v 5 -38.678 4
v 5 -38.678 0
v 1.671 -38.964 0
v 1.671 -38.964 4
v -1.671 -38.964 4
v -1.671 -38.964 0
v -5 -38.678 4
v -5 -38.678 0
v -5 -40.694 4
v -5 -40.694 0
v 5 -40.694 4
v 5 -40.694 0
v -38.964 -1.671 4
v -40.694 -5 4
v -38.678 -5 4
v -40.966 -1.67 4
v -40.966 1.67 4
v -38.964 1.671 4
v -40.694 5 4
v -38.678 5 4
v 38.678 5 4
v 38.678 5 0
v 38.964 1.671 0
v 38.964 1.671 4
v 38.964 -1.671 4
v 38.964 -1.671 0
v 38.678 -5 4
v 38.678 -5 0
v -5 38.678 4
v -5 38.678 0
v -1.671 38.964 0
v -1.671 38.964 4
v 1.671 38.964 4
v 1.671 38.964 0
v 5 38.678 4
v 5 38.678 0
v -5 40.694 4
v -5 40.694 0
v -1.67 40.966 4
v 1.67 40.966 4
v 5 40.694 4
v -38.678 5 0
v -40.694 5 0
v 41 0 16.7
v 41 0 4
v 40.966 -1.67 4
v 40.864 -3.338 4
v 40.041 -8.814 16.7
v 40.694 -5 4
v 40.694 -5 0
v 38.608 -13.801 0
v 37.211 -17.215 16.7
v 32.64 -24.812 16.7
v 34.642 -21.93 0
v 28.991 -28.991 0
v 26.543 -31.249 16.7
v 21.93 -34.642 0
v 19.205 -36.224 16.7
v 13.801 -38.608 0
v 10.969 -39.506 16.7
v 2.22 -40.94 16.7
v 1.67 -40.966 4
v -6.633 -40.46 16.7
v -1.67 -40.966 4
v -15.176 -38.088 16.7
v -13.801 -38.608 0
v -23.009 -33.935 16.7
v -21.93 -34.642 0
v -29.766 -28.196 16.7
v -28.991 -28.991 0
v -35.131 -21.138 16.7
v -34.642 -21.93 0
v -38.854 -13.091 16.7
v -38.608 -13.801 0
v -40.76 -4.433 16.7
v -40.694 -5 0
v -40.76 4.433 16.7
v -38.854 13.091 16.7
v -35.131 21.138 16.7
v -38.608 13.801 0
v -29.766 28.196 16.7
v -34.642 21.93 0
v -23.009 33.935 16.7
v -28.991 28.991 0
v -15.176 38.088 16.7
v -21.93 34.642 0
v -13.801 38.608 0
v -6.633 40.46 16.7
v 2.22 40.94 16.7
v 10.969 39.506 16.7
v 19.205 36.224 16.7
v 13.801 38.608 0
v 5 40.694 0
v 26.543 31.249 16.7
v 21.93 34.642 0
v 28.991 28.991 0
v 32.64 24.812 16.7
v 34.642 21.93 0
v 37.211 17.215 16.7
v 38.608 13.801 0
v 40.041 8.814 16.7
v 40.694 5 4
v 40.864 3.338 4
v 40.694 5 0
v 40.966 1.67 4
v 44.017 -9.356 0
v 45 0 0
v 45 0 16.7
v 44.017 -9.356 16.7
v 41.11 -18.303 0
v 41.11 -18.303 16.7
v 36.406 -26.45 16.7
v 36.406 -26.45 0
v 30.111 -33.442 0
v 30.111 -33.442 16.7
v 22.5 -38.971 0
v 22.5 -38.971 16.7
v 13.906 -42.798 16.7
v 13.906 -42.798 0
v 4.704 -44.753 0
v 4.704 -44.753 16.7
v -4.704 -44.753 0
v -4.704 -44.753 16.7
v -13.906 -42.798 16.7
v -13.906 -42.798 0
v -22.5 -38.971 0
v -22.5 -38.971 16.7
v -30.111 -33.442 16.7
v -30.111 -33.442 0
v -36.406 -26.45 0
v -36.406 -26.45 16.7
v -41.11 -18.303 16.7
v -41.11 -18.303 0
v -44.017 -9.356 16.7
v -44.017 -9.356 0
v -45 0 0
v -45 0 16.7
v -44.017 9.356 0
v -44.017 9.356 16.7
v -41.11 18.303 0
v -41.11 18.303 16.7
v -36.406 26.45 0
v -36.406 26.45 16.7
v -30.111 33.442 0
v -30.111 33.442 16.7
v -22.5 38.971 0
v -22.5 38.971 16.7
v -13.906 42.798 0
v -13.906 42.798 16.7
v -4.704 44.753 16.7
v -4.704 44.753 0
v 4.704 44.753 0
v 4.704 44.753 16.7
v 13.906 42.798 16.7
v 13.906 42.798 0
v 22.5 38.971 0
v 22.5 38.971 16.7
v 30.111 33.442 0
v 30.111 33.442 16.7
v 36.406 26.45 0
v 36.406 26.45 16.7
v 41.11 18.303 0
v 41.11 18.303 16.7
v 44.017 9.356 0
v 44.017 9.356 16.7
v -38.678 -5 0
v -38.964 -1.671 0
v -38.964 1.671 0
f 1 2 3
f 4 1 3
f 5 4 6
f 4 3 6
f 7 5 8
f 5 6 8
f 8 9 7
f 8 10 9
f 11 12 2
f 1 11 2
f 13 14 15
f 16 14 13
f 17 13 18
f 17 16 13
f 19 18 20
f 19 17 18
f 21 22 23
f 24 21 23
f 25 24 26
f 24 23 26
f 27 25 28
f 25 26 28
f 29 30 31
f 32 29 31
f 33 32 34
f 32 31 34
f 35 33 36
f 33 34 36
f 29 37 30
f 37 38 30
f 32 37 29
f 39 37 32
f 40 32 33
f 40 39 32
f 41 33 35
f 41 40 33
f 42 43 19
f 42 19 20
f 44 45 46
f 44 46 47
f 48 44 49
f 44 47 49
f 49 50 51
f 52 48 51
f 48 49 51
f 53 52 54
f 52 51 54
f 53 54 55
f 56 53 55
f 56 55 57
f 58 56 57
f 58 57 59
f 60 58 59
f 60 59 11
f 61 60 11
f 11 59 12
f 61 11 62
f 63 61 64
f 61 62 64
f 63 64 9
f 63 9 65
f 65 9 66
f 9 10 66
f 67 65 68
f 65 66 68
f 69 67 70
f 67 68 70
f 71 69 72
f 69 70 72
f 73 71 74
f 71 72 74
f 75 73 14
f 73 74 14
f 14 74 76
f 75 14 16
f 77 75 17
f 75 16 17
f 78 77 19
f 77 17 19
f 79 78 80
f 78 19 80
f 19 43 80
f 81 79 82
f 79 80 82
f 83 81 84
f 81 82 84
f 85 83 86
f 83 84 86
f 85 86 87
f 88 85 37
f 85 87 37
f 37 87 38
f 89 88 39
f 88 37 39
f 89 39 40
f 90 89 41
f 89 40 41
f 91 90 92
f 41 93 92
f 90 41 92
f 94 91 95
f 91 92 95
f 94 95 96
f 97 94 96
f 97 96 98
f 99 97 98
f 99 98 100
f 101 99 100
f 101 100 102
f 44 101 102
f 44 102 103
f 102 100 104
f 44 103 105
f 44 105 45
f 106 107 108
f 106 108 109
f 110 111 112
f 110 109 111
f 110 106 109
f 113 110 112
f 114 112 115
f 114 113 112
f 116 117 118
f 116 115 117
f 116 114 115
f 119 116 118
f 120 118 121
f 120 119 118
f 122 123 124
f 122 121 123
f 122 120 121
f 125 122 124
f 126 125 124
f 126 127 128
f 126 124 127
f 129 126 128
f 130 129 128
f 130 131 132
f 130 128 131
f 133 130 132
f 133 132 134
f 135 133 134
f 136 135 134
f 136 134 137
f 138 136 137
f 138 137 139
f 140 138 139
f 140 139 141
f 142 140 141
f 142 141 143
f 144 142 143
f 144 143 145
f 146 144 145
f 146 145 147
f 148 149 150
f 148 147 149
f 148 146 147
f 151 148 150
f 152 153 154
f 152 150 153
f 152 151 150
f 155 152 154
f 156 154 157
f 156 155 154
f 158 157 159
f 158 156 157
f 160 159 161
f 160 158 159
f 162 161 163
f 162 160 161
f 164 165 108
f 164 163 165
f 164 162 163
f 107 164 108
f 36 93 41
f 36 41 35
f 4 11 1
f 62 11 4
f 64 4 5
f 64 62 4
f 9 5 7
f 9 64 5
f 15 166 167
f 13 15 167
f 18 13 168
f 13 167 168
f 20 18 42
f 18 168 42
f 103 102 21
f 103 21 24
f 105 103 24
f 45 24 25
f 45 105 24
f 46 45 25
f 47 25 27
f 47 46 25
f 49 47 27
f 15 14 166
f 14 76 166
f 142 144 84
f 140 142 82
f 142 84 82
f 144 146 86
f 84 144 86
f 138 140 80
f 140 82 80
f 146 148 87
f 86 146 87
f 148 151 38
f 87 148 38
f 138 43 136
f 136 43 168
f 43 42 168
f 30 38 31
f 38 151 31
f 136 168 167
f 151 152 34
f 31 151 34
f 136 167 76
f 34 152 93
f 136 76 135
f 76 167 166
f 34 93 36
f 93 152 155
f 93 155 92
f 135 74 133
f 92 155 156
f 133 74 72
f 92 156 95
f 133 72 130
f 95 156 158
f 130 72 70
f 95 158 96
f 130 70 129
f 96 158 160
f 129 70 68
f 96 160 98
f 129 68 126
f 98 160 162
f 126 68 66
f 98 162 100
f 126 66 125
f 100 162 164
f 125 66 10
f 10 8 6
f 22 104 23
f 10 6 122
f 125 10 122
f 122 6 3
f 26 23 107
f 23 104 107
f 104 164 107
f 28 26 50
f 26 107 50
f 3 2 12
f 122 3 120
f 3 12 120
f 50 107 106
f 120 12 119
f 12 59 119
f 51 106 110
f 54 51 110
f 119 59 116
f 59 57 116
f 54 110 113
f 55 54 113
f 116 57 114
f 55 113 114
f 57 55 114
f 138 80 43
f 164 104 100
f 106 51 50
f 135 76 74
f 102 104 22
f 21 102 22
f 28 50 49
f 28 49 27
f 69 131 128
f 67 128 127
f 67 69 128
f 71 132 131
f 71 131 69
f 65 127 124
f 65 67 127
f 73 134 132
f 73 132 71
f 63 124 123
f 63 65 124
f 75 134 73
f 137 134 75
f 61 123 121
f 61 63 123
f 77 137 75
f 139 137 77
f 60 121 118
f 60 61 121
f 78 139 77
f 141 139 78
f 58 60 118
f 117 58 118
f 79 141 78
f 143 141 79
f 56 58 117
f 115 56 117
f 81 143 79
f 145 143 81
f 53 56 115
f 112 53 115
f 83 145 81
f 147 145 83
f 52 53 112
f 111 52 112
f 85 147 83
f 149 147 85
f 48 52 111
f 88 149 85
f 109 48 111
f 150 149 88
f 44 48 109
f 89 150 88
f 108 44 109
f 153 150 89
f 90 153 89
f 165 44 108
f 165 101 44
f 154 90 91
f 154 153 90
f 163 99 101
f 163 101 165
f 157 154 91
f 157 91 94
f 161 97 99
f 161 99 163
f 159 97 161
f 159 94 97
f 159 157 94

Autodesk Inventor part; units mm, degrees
ref_plane "YZ Plane" through (0, 0, 0) normal (1, 0, 0) x (0, 1, 0)
ref_plane "XZ Plane" through (0, 0, 0) normal (0, 1, 0) x (-1, 0, 0)
ref_plane "XY Plane" through (0, 0, 0) normal (0, 0, 1) x (1, 0, 0)
sketch "Sketch1" plane through (0, 0, 0) normal (0, 0, 1) x (1, 0, 0)
  circle A0 centre (0, 0) radius 16.5
  circle A1 centre (0, 0) radius 22
  circle A2 centre (0, 0) radius 41
  circle A3 centre (0, 0) radius 45
  line L0 (0, 0) -> (-82.1679, 0) construction
  line L1 (0, 0) -> (52.3587, 0) construction
  line L2 (0, 0) -> (0, 55.2671) construction
  line L3 (0, 0) -> (0, -51.5979) construction
  circle A4 centre (0, 0) radius 39
  line L4 (5, 40.694) -> (5, 38.6782)
  line L5 (-5, 40.694) -> (-5, 38.6782)
  arc A5 (5, 40.694) -> (-5, 40.694) centre (0, 0) ccw
  arc A6 (5, 38.6782) -> (-5, 38.6782) centre (0, 0) ccw
  dimension "d2" = 82
  dimension "d15" = 78
  dimension "d0" = 33
  dimension "d1" = 44
  dimension "d3" = 90
  dimension "d16" = 5
extrude "outer" add sketch "Sketch1" along normal blind 16.7 contours A3
extrude "inner" [suppressed]
extrude "Extrusion4" add sketch "Sketch1" along normal blind 4 contours L4 A4 L5 A2 picked at (3.8902, 39.4454)
pattern_circular "Circular Pattern1" count 4 over 360 about axis through (0, 0, -10) along (0, 0, 1) of "Extrusion4"
equation "\"d15\" = PCB_OD"
equation "\"d0\" = skeleton_OD"
equation "\"d1\" = PCB_ID"
equation "\"d3\" = carbon_OD"
equation "\"PCB_OD\" = 78"
equation "\"PCB_ID\" = 44"
equation "\"skeleton_OD\" = 33"
equation "\"carbon_OD\" = 90"
properties part number "hall_case"
